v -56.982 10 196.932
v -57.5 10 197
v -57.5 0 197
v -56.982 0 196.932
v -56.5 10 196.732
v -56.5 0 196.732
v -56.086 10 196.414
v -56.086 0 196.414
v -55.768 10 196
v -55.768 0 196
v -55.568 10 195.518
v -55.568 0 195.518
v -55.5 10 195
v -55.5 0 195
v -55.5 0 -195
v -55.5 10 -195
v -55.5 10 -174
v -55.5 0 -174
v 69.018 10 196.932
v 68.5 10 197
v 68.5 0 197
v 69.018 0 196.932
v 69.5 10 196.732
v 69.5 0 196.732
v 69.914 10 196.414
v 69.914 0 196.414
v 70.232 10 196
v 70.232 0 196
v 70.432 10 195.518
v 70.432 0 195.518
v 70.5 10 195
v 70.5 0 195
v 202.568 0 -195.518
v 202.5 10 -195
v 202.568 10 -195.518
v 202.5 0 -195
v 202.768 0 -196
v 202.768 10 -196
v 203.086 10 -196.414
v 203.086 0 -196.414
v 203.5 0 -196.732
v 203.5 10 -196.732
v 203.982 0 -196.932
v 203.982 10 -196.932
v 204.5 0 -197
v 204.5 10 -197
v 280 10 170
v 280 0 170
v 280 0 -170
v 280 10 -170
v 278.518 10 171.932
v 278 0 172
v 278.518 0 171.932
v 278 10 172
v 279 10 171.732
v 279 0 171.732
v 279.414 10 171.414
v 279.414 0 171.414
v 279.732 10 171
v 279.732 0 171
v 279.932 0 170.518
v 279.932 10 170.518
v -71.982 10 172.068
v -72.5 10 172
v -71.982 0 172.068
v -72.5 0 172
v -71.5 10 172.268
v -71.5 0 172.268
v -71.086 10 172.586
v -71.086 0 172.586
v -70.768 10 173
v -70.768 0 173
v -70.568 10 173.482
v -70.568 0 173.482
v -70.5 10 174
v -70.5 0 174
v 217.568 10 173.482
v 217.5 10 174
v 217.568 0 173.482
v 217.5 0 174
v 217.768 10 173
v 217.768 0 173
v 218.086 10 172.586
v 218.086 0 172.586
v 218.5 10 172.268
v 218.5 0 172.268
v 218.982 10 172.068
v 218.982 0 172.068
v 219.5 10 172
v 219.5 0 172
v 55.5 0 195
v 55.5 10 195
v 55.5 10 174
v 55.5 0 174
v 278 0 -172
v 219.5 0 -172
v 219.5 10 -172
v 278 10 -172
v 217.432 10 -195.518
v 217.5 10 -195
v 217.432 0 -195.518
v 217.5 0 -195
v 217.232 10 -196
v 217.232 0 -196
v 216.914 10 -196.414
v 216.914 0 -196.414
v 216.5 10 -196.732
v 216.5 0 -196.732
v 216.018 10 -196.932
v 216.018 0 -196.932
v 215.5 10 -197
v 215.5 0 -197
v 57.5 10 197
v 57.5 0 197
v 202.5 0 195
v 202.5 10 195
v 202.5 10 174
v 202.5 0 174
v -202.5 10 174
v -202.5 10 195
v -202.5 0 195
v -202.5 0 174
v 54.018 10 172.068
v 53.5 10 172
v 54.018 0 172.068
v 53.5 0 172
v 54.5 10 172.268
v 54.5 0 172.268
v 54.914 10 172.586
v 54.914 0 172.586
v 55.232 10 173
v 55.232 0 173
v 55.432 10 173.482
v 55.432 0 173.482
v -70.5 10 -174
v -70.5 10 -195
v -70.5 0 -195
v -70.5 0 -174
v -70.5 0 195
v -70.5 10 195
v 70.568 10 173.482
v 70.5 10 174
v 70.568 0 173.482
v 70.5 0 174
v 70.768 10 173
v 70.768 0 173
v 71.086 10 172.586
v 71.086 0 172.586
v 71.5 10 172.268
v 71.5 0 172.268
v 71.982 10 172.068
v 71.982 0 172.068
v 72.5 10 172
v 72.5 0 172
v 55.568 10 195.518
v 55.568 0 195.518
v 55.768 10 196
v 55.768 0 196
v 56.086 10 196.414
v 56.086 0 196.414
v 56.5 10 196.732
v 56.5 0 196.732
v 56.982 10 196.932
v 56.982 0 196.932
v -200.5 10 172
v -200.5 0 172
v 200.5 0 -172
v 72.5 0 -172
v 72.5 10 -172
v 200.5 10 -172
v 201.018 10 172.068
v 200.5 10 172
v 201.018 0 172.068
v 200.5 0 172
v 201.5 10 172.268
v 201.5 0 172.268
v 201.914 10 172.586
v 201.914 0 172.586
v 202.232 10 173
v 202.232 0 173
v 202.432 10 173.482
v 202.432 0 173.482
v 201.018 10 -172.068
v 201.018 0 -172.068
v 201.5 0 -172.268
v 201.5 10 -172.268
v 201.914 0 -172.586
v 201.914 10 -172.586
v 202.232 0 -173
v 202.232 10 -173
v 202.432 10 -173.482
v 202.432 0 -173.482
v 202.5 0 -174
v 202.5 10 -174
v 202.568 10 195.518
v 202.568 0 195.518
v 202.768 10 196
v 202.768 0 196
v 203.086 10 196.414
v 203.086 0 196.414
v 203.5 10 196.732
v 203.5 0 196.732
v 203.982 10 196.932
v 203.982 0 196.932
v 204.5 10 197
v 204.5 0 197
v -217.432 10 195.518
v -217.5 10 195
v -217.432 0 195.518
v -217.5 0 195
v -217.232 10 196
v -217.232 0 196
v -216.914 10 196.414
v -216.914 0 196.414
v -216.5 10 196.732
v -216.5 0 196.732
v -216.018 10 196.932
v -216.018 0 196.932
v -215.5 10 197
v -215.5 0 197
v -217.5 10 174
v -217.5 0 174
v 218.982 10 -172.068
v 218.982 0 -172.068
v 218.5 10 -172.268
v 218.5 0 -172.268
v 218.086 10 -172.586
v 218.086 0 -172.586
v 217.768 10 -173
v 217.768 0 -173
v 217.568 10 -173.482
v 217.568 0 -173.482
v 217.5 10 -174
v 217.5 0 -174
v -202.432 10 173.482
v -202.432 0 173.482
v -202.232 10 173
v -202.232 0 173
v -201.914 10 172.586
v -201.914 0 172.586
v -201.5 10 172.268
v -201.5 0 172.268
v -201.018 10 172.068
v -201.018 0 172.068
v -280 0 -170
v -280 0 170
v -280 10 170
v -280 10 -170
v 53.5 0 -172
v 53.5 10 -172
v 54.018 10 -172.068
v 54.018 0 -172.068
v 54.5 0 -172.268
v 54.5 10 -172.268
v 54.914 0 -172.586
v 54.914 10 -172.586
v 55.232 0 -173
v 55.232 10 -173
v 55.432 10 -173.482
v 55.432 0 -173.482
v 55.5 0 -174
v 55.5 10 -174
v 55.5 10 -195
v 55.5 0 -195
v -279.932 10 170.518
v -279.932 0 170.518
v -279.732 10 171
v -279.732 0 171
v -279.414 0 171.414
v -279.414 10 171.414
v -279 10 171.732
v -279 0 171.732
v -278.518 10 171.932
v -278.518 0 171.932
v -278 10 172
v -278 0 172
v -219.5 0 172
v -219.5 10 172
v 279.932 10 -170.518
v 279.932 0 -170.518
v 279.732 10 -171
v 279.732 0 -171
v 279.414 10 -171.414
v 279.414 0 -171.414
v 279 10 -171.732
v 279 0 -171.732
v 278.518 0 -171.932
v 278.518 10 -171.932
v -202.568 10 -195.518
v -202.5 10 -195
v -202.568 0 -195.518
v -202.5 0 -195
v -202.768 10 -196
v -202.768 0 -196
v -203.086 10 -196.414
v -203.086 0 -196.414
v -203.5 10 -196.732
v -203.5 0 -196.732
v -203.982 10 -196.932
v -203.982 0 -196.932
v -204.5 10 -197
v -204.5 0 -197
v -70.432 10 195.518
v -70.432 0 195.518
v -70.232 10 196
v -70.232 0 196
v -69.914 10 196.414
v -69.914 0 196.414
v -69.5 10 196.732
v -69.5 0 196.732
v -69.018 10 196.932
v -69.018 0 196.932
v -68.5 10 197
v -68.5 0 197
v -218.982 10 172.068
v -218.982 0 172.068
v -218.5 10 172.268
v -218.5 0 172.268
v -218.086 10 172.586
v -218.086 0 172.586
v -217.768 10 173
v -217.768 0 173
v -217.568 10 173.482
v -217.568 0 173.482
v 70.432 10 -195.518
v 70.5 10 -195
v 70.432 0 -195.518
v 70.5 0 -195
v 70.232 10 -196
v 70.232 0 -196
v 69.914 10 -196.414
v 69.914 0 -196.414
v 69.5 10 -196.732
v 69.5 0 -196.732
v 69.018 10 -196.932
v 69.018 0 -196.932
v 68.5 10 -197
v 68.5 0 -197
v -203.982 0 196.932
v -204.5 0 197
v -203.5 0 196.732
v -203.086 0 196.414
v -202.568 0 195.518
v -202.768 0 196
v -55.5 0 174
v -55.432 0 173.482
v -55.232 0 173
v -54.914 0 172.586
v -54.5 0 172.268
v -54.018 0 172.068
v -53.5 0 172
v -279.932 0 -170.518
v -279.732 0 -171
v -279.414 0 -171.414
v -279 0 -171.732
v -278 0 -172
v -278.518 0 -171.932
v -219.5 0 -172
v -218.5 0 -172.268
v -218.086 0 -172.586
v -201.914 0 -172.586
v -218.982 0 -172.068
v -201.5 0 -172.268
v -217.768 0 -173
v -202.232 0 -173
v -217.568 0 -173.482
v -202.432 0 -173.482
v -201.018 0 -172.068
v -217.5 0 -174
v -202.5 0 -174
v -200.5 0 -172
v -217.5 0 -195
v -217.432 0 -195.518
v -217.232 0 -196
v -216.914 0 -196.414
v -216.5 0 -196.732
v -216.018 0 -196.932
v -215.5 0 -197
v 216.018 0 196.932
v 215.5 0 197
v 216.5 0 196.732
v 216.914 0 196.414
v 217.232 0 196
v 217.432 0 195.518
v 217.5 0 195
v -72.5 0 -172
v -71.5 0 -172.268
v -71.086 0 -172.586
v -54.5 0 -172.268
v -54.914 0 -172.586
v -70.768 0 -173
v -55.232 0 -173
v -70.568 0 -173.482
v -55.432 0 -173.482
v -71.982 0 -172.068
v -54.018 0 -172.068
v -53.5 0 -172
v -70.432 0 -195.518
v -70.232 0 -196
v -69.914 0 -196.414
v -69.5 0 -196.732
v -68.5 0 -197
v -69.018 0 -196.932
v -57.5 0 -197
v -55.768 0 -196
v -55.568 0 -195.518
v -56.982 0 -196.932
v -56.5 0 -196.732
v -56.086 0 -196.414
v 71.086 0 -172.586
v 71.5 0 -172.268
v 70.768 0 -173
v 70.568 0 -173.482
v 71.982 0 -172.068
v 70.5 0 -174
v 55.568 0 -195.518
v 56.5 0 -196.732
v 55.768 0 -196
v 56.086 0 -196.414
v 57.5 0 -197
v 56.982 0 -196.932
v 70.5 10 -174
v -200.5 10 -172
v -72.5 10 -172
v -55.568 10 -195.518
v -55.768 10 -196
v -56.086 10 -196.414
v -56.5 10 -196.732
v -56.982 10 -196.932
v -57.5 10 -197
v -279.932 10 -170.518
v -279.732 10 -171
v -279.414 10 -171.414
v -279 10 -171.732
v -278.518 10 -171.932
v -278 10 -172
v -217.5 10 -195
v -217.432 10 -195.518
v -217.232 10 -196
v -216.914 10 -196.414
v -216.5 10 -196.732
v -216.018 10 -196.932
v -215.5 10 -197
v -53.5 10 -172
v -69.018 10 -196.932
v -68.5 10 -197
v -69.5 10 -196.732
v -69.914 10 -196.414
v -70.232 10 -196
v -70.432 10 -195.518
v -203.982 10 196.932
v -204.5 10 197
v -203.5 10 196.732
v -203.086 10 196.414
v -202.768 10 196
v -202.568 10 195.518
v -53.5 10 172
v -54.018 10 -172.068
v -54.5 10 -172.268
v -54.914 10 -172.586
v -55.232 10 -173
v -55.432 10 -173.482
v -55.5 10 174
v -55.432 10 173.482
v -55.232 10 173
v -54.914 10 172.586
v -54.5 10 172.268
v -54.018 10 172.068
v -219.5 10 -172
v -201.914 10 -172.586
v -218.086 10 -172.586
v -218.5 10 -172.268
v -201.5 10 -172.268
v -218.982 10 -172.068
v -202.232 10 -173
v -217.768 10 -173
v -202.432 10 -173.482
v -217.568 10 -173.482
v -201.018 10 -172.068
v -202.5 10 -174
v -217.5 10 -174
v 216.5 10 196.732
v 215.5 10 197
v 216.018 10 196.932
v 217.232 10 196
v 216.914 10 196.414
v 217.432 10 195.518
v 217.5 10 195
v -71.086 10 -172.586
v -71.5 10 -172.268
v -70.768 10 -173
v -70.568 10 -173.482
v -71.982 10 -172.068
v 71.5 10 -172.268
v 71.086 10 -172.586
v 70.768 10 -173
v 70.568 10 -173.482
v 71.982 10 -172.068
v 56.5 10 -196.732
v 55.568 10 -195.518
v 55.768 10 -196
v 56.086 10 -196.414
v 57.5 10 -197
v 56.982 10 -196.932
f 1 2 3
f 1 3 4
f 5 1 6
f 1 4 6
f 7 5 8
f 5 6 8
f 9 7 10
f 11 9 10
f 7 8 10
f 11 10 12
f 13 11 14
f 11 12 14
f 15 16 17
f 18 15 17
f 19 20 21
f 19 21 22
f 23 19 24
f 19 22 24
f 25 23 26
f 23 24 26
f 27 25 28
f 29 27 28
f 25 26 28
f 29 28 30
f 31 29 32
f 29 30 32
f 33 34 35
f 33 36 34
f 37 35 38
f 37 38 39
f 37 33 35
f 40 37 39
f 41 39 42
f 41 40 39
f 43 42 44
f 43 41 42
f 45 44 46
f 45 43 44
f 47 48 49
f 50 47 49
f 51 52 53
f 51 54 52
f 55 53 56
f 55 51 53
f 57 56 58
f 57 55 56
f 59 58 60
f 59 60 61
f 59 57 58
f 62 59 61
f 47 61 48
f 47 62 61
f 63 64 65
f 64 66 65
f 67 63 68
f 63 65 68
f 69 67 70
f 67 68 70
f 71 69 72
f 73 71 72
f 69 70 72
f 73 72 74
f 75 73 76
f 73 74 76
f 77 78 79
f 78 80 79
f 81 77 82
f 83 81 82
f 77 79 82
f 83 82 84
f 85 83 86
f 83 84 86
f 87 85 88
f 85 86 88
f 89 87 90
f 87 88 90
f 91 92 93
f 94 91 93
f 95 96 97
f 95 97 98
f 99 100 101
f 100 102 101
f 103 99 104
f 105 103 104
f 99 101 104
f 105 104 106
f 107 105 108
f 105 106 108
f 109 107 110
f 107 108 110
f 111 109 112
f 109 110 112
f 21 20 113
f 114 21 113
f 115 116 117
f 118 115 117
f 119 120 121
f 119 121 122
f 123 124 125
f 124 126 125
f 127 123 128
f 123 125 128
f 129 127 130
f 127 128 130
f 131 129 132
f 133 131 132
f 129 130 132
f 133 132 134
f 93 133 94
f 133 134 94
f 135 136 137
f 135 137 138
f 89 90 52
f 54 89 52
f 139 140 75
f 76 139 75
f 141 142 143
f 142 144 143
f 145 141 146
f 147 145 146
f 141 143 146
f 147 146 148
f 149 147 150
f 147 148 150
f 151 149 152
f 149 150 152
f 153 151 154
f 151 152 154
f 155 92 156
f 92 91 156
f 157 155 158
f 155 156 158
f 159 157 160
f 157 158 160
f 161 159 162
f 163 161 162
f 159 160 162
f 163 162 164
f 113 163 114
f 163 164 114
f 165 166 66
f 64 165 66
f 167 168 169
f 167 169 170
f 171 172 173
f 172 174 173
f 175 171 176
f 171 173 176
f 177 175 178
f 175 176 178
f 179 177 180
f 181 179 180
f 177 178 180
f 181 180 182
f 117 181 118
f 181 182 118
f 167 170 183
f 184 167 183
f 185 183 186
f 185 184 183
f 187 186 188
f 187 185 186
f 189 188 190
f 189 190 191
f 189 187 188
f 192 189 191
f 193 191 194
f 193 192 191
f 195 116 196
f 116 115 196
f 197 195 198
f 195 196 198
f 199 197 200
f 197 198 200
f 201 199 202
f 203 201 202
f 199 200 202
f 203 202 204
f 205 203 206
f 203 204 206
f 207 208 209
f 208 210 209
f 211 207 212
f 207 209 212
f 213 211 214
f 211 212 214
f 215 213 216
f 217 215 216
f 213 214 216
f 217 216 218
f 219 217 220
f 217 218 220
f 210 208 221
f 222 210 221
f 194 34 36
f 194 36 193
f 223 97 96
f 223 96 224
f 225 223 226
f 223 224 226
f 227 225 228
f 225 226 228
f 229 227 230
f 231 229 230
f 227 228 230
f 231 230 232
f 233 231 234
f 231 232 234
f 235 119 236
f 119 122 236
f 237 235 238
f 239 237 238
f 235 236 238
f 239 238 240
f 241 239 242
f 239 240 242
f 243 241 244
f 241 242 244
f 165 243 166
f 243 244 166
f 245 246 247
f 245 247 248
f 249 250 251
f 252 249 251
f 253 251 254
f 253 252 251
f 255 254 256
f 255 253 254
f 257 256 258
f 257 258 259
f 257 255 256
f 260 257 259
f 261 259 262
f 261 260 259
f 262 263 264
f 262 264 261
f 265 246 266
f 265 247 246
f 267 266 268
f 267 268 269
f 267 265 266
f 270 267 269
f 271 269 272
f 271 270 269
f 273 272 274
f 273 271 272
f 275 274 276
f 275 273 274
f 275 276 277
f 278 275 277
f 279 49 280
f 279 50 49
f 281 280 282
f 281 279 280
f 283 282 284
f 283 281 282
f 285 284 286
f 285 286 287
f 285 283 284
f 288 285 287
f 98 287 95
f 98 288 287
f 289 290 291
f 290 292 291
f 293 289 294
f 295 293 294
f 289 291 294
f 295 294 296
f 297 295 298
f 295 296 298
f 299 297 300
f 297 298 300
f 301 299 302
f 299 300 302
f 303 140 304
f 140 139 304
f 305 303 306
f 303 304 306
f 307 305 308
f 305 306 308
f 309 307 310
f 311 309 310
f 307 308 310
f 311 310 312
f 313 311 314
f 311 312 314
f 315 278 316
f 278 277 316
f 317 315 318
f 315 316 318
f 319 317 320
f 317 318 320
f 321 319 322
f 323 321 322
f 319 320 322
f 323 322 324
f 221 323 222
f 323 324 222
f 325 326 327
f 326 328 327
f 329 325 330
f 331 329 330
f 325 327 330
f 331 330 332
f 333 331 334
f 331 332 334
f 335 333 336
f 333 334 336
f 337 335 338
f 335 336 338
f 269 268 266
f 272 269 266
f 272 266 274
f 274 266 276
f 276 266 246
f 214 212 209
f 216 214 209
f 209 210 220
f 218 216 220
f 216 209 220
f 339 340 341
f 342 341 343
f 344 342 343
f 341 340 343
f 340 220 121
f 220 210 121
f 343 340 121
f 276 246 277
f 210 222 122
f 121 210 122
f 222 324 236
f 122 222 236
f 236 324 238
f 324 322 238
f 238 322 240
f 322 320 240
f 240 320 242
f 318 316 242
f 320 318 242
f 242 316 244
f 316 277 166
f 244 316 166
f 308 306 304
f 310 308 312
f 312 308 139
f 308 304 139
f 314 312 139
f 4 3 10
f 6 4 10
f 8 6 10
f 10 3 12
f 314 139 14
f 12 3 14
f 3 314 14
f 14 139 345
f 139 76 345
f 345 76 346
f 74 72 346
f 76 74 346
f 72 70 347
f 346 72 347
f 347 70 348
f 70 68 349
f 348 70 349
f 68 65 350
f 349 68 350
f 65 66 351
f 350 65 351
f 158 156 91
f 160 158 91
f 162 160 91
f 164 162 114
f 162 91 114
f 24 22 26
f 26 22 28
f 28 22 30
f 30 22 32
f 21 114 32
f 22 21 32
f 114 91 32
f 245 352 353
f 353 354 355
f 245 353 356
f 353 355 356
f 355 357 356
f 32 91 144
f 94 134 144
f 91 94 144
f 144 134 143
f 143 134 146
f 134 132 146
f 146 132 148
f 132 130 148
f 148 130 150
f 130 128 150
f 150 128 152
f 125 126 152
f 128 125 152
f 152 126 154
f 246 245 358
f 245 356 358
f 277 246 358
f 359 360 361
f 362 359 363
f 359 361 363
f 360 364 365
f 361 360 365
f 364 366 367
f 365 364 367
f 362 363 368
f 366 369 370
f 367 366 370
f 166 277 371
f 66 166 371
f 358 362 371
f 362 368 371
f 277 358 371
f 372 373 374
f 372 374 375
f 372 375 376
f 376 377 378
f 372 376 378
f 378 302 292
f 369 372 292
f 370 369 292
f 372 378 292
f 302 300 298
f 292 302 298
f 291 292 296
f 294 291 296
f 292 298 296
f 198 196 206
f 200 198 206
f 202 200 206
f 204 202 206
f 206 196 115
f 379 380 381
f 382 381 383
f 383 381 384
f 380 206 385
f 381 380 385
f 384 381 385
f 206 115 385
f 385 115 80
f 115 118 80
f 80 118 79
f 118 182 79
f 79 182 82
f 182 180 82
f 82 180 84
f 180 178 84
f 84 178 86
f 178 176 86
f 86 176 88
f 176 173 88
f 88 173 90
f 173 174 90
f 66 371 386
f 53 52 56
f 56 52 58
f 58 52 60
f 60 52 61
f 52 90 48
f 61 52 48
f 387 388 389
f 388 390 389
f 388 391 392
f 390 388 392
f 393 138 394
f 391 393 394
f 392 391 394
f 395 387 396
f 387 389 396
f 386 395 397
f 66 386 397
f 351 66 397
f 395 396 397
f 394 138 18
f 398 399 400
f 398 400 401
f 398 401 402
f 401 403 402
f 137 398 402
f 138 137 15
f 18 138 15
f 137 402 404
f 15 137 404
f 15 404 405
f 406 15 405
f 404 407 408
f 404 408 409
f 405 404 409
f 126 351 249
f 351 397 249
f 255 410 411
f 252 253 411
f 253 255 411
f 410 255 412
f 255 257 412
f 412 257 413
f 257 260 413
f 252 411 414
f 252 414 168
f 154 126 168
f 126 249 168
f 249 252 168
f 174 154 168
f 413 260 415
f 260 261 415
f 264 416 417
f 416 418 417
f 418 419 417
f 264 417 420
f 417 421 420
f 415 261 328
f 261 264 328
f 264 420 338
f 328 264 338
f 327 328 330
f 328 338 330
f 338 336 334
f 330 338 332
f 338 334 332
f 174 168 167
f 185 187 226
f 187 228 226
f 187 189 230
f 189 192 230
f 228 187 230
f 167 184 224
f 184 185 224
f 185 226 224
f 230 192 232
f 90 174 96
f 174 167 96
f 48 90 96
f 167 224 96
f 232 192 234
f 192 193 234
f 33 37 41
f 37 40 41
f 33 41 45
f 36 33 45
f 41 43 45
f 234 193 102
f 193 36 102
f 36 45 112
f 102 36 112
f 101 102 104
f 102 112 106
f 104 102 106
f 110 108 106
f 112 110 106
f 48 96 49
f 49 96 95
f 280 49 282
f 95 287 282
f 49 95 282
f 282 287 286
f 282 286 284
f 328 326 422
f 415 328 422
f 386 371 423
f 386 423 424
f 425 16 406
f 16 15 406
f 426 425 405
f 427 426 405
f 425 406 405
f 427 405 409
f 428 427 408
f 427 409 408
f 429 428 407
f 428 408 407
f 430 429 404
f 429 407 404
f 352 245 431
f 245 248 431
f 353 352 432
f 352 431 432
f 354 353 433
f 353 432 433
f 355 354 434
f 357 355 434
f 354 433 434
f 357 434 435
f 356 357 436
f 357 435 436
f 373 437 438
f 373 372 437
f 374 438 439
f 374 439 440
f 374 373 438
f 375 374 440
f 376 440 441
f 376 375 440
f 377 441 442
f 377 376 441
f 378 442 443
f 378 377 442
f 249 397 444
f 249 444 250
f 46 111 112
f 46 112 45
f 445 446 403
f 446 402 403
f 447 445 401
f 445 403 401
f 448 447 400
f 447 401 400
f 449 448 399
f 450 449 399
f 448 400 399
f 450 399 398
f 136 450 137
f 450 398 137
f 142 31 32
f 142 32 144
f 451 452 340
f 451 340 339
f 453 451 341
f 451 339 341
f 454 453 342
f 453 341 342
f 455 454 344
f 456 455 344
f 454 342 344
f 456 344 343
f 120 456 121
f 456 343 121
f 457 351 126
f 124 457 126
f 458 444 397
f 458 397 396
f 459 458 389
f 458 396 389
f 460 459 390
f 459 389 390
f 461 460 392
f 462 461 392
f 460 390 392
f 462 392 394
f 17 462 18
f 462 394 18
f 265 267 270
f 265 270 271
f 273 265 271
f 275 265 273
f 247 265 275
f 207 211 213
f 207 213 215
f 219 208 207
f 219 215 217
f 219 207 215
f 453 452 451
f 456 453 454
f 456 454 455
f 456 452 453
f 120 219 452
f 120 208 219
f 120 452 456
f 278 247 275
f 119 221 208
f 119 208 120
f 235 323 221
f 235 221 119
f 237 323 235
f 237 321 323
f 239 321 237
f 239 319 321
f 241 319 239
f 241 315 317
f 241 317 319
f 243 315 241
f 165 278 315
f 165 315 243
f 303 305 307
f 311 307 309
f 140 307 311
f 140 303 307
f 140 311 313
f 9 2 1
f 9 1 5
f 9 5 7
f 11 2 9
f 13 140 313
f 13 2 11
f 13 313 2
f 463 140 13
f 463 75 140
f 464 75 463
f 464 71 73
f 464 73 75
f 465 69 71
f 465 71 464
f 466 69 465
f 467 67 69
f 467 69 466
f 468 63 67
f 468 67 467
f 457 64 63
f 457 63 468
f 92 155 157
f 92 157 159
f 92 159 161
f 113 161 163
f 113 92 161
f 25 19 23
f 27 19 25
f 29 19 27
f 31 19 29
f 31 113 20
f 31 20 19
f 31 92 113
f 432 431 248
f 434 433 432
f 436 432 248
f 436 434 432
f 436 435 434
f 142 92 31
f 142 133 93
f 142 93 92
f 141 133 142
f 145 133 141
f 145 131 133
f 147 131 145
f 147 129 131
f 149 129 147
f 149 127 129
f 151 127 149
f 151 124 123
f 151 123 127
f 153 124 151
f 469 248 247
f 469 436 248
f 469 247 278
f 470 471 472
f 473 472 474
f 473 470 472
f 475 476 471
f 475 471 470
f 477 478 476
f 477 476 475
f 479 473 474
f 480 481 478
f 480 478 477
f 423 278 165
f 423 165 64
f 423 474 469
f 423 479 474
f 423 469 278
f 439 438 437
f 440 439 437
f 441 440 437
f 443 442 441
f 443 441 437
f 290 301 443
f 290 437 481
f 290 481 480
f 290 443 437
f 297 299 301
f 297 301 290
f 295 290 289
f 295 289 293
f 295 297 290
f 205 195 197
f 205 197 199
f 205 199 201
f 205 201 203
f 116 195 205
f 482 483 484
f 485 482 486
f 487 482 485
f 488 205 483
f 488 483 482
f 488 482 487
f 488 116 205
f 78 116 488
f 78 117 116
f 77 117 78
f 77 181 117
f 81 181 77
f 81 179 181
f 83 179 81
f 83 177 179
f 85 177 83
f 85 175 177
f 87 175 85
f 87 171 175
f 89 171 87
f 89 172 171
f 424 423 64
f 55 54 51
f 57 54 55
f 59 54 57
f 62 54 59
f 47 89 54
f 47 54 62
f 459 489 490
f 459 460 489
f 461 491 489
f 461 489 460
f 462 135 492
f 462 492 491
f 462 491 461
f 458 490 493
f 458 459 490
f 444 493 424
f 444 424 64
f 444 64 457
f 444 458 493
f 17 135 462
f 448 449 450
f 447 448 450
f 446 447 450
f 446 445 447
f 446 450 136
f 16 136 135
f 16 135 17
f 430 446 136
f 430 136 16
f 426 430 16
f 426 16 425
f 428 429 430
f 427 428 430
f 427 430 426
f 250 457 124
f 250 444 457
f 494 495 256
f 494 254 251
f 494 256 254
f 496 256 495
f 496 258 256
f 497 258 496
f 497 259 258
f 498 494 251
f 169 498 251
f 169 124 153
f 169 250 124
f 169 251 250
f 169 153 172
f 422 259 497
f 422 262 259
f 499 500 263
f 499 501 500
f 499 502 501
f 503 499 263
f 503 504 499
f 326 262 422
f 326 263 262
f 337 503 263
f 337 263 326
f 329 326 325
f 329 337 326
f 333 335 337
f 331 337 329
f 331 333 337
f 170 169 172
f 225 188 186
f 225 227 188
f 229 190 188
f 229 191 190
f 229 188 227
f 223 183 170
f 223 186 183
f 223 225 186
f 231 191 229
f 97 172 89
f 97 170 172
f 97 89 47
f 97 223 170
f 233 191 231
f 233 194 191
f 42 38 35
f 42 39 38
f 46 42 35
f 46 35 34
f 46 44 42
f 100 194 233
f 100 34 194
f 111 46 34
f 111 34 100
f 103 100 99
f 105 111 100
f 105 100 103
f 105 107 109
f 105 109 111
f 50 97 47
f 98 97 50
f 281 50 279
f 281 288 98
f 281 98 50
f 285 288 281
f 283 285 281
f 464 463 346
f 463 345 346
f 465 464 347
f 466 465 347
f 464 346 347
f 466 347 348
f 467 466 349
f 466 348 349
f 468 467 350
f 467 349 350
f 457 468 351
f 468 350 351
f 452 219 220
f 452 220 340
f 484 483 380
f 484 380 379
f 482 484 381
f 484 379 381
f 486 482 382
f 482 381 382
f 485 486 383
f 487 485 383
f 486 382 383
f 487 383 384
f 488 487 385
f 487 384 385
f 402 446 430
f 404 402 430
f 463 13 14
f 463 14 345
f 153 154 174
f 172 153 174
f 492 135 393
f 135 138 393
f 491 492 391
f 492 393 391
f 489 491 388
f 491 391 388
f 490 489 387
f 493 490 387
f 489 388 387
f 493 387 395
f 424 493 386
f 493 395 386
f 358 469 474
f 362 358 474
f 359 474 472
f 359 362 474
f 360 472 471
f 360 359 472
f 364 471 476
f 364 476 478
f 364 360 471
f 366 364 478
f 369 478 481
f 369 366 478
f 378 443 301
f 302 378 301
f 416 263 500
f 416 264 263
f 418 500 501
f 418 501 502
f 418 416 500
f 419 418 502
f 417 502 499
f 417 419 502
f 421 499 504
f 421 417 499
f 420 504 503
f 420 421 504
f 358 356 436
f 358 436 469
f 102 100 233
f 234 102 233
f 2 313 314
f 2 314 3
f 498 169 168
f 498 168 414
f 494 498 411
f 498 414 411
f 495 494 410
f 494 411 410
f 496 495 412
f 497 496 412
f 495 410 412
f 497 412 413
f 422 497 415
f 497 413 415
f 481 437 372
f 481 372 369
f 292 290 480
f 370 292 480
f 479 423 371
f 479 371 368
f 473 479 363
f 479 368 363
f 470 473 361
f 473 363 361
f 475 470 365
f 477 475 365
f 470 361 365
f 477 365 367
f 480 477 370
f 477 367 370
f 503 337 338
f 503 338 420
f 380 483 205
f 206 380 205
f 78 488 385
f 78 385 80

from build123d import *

# Parameters (mm, degrees)
SKETCH1_W               = 560
SKETCH1_H               = 344
BOSS_EXTRUDE1_DEPTH     = 10
SKETCH2_W               = 15
SKETCH2_H               = 25
BOSS_EXTRUDE2_DEPTH     = 10
MIRROR5_COPY_1_SKETCH_W = 15
MIRROR5_COPY_1_SKETCH_H = 25
MIRROR5_COPY_1_DEPTH    = 10
FILLET3_R               = 2


with BuildPart() as part:
    # Sketch1 → Boss-Extrude1 (new body)
    with BuildSketch(Plane(origin=(0, 0, 0), x_dir=(1, 0, 0), z_dir=(0, 1, 0))):
        Rectangle(SKETCH1_W, SKETCH1_H)
    extrude(amount=BOSS_EXTRUDE1_DEPTH)

    # Sketch2 → Boss-Extrude2 (add)
    with BuildSketch(Plane(origin=(0, 10, 0), x_dir=(1, 0, 0), z_dir=(0, 1, 0))):
        with Locations((-63, -184.5)):
            Rectangle(SKETCH2_W, SKETCH2_H)
        with Locations((-210, -184.5)):
            Rectangle(SKETCH2_W, SKETCH2_H)
    boss_extrude2 = extrude(amount=-BOSS_EXTRUDE2_DEPTH)

    # Mirror4: Boss-Extrude2 across plane
    add(boss_extrude2.mirror(Plane(origin=(0, 0, 0), x_dir=(0, 0, 1), z_dir=(1, 0, 0))))

    # Mirror5: Boss-Extrude2 across plane
    add(boss_extrude2.mirror(Plane.XY))

    # Mirror5 copy 1 sketch → Mirror5 copy 1 (add)
    with BuildSketch(Plane(origin=(0, 10, 0), x_dir=(-1, 0, 0), z_dir=(0, 1, 0))):
        with Locations((-63, -184.5)):
            Rectangle(MIRROR5_COPY_1_SKETCH_W, MIRROR5_COPY_1_SKETCH_H)
        with Locations((-210, -184.5)):
            Rectangle(MIRROR5_COPY_1_SKETCH_W, MIRROR5_COPY_1_SKETCH_H)
    extrude(amount=-MIRROR5_COPY_1_DEPTH)

    # Fillet3
    fillet3_edges = [part.edges().sort_by_distance(p)[0] for p in [
        (-70.5, 5, 197),
        (-70.5, 5, 172),
        (-55.5, 5, 172),
        (-55.5, 5, 197),
        (-202.5, 5, 172),
        (-202.5, 5, 197),
        (-217.5, 5, 197),
        (-217.5, 5, 172),
        (55.5, 5, 172),
        (55.5, 5, 197),
        (70.5, 5, 197),
        (70.5, 5, 172),
        (217.5, 5, 197),
        (217.5, 5, 172),
        (202.5, 5, 172),
        (202.5, 5, 197),
        (70.5, 5, -197),
        (70.5, 5, -172),
        (55.5, 5, -172),
        (55.5, 5, -197),
        (202.5, 5, -172),
        (202.5, 5, -197),
        (217.5, 5, -197),
        (217.5, 5, -172),
        (-280, 5, -172),
        (280, 5, -172),
        (280, 5, 172),
        (-280, 5, 172),
        (-55.5, 5, -172),
        (-55.5, 5, -197),
        (-70.5, 5, -197),
        (-70.5, 5, -172),
        (-217.5, 5, -197),
        (-217.5, 5, -172),
        (-202.5, 5, -172),
        (-202.5, 5, -197),
    ]]
    fillet(fillet3_edges, radius=FILLET3_R)


solid = part.part
